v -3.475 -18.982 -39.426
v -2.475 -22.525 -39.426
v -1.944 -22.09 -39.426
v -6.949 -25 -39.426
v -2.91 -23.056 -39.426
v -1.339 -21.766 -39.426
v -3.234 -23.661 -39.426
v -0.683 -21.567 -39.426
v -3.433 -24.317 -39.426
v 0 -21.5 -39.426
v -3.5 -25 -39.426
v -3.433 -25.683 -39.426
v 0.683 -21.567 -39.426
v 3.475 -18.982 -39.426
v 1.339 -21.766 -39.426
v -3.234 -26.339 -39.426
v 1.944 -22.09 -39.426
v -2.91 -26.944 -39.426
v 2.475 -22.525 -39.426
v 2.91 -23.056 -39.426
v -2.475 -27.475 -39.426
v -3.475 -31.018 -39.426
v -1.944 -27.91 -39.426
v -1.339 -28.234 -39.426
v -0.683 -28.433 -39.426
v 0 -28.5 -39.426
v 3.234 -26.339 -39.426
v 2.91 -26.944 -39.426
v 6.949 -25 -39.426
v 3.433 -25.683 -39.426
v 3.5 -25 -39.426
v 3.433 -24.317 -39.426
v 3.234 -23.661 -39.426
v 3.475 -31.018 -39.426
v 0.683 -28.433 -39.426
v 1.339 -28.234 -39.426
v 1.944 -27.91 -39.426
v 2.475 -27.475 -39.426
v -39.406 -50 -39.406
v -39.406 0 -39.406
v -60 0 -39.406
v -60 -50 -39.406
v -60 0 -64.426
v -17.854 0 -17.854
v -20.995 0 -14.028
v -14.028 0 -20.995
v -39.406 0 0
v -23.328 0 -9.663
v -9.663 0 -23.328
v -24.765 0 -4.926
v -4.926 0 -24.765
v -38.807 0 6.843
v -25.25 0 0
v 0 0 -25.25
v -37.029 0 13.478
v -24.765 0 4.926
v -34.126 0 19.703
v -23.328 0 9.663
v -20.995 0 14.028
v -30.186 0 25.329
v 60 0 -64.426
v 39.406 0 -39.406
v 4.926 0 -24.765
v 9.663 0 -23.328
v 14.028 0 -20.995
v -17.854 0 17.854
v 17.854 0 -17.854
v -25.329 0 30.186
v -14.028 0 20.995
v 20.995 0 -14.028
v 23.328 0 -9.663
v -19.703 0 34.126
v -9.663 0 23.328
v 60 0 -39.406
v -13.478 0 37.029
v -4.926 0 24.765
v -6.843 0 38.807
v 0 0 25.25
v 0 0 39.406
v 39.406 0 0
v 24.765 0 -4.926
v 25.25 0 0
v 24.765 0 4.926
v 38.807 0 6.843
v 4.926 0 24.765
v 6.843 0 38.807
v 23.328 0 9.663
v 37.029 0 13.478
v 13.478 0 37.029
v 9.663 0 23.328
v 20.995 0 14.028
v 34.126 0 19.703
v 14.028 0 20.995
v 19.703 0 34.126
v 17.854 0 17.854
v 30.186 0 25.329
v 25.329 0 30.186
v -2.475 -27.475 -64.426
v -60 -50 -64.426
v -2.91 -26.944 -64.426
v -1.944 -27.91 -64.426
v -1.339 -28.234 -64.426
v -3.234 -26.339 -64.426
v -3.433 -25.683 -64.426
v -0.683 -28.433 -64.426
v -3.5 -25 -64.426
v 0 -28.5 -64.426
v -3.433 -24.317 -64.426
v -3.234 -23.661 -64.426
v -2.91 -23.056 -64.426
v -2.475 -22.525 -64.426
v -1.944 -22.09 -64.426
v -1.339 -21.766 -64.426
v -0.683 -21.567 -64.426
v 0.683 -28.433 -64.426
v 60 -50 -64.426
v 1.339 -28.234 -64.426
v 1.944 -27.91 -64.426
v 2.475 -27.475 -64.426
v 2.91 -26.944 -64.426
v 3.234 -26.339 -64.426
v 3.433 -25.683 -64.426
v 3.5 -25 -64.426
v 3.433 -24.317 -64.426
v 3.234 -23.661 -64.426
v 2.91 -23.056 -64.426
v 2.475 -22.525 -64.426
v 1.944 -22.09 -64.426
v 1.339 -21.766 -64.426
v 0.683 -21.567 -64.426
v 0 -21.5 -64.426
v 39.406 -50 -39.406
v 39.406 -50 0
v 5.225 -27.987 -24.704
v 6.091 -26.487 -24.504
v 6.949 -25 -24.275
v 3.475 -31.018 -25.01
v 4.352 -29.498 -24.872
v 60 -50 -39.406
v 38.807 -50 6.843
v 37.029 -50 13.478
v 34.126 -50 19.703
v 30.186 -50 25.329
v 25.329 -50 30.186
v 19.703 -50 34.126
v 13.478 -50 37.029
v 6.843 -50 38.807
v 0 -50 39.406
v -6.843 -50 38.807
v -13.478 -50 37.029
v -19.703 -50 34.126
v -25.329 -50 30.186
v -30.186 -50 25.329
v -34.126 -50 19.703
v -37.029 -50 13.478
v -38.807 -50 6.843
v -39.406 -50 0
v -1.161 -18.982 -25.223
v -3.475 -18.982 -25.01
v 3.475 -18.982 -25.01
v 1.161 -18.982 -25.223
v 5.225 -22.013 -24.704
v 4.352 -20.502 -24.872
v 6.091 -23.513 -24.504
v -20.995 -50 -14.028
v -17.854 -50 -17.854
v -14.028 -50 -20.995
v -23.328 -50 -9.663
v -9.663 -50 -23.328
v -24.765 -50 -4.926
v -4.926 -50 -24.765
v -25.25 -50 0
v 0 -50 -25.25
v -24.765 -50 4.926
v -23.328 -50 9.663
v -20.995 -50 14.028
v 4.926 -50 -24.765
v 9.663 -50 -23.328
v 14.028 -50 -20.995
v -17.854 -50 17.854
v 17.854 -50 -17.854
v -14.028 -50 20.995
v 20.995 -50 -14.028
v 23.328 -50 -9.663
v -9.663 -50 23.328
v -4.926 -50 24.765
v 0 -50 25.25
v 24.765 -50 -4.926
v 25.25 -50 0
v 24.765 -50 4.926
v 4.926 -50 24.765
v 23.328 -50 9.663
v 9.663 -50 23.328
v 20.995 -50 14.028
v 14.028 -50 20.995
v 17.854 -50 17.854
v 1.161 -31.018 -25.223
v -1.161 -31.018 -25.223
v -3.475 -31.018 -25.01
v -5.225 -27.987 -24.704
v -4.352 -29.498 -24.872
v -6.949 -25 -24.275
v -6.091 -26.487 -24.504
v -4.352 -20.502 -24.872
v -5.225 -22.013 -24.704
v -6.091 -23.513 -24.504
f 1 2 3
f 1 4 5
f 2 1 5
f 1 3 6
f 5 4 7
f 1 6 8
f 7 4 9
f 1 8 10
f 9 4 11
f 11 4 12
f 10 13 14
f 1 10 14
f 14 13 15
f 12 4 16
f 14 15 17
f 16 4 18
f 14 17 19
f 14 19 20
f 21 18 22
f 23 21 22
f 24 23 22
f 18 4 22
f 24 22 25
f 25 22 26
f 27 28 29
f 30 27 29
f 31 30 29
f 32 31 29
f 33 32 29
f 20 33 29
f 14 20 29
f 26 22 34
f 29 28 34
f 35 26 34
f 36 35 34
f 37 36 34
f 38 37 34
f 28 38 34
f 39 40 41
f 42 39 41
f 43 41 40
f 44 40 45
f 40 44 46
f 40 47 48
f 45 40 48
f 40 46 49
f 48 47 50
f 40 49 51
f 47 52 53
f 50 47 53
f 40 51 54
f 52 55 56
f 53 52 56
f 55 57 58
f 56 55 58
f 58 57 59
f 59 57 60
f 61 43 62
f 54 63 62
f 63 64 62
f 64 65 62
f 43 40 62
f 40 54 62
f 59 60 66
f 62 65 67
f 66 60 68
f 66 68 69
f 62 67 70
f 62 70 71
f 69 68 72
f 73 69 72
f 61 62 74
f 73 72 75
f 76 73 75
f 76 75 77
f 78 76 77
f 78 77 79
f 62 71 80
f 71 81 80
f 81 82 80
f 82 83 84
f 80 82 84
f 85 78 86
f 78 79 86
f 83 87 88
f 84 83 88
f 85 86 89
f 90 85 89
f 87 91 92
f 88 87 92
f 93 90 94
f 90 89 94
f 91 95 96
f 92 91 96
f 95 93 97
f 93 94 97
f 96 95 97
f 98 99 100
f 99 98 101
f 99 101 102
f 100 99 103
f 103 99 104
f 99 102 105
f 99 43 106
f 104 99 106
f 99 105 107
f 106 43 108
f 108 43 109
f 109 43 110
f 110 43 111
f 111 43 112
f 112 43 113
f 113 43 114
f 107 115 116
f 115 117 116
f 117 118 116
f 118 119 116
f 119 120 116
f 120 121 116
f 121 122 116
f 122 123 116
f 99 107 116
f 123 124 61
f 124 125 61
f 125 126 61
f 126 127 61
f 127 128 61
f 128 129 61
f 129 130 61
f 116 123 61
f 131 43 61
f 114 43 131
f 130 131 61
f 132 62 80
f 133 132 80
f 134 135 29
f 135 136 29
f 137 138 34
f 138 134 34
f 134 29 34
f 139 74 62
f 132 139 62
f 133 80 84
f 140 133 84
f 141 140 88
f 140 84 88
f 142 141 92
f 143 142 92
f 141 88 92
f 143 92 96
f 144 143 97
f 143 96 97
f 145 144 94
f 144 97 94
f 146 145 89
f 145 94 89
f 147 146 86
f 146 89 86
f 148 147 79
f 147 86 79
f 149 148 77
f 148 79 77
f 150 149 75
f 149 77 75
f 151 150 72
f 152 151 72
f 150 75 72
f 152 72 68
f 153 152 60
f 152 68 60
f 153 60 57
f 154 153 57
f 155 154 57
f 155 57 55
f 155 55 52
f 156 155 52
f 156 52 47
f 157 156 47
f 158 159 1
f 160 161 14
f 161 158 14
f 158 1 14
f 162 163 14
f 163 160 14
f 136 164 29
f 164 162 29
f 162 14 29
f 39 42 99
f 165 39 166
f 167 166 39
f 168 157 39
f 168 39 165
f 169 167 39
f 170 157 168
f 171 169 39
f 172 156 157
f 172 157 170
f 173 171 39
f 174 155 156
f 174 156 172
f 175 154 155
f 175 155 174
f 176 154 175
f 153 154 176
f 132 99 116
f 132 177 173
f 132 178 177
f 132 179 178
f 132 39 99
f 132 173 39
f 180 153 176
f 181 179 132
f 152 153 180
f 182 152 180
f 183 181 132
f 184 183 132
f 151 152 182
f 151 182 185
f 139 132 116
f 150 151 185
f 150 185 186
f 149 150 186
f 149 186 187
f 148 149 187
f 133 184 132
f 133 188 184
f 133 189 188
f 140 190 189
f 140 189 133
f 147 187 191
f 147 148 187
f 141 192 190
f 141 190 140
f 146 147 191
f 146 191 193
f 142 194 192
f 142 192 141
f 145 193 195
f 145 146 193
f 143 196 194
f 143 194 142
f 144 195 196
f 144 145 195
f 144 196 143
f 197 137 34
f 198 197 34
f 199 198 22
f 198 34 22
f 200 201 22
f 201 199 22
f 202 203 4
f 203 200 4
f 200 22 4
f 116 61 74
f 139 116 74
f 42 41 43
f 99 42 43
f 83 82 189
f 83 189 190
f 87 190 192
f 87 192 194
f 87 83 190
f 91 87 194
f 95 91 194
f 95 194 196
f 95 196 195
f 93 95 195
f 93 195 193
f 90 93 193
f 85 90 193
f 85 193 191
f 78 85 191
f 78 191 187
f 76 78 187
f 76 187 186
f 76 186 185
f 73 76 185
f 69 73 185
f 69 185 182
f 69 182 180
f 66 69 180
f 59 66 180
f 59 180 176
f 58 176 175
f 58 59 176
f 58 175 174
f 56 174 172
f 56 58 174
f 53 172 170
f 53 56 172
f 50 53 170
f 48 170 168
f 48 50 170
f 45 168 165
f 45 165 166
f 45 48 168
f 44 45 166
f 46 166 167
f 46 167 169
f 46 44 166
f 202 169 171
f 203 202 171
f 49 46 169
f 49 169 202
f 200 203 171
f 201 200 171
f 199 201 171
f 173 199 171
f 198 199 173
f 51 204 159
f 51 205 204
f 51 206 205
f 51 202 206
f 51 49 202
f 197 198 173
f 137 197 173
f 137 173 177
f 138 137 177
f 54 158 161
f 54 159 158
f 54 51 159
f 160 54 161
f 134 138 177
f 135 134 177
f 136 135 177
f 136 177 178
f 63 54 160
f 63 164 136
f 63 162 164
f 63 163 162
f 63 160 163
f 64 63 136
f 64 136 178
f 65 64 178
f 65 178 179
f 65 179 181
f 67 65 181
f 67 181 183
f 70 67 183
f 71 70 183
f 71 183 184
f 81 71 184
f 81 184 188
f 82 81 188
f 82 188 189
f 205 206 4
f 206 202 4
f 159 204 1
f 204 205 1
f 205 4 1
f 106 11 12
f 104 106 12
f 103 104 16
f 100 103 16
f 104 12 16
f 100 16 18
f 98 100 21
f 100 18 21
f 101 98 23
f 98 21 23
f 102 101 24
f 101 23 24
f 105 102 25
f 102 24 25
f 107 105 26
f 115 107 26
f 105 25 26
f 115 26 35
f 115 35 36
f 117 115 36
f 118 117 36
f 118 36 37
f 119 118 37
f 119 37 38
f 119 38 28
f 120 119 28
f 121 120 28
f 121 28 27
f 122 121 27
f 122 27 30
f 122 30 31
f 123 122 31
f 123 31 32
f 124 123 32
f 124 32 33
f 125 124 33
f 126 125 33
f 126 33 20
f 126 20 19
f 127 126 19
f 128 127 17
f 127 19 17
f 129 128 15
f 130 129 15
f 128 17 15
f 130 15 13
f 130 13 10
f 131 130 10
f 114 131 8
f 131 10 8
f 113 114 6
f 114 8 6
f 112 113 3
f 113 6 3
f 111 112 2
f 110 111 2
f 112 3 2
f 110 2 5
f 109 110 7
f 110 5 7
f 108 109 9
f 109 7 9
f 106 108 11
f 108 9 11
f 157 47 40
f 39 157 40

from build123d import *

# Parameters (mm, degrees)
F0_R     = 25.25
F1_DEPTH = 50
F4_D     = 7
F4_DEPTH = 70
F4_TIP   = 2.1030121666
F6_DEPTH = 25


with BuildPart() as f1:
    # F0 (on Front) → F1 (new body)
    with BuildSketch(Plane.XZ):
        with BuildLine():
            ThreePointArc((0, -39.4056375813), (27.8639935507, -27.8639935507), (39.4056375813, 0))
            ThreePointArc((39.4056375813, 0), (0, 39.4056375813), (-39.4056375813, 0))
            ThreePointArc((-39.4056375813, 0), (-27.8639935507, -27.8639935507), (0, -39.4056375813))
        make_face()
        Circle(F0_R, mode=Mode.SUBTRACT)
        with BuildLine():
            ThreePointArc((0, -39.4056375813), (-27.8639935507, -27.8639935507), (-39.4056375813, 0))
            Line((-39.4056375813, 0), (-39.4056375813, -39.4056375813))
            Line((-39.4056375813, -39.4056375813), (0, -39.4056375813))
        make_face()
        Polygon((0, -64.4255876541), (0, -39.4056375813), (-39.4056375813, -39.4056375813), (-60, -39.4056375813), (-60, -64.4255876541), align=None)
        Polygon((39.4056375813, -39.4056375813), (0, -39.4056375813), (0, -64.4255876541), (60, -64.4255876541), (60, -39.4056375813), align=None)
        with BuildLine():
            Line((39.4056375813, -39.4056375813), (39.4056375813, 0))
            ThreePointArc((39.4056375813, 0), (27.8639935507, -27.8639935507), (0, -39.4056375813))
            Line((0, -39.4056375813), (39.4056375813, -39.4056375813))
        make_face()
    extrude(amount=F1_DEPTH)

    # F4
    with Locations(Plane(origin=(0, 0, -64.4255876541), x_dir=(1, 0, 0), z_dir=(0, 0, -1))):
        with Locations((0, 25)):
            Hole(F4_D / 2, depth=F4_DEPTH)
            with Locations((0, 0, -(F4_DEPTH + F4_TIP / 2))):  # 118° drill point
                Cone(0, F4_D / 2, F4_TIP, mode=Mode.SUBTRACT)

    # F5 (on offset) → F6 (cut)
    with BuildSketch(Plane(origin=(0, 0, -39.4255876541), x_dir=(1, 0, 0), z_dir=(0, 0, -1))):
        Polygon((-3.4745540902, 18.9818957821), (3.4745540902, 18.9818957821), (6.9491081805, 25), (3.4745540902, 31.0181042179), (-3.4745540902, 31.0181042179), (-6.9491081805, 25), align=None)
    extrude(amount=-F6_DEPTH, mode=Mode.SUBTRACT)


solid = f1.part
